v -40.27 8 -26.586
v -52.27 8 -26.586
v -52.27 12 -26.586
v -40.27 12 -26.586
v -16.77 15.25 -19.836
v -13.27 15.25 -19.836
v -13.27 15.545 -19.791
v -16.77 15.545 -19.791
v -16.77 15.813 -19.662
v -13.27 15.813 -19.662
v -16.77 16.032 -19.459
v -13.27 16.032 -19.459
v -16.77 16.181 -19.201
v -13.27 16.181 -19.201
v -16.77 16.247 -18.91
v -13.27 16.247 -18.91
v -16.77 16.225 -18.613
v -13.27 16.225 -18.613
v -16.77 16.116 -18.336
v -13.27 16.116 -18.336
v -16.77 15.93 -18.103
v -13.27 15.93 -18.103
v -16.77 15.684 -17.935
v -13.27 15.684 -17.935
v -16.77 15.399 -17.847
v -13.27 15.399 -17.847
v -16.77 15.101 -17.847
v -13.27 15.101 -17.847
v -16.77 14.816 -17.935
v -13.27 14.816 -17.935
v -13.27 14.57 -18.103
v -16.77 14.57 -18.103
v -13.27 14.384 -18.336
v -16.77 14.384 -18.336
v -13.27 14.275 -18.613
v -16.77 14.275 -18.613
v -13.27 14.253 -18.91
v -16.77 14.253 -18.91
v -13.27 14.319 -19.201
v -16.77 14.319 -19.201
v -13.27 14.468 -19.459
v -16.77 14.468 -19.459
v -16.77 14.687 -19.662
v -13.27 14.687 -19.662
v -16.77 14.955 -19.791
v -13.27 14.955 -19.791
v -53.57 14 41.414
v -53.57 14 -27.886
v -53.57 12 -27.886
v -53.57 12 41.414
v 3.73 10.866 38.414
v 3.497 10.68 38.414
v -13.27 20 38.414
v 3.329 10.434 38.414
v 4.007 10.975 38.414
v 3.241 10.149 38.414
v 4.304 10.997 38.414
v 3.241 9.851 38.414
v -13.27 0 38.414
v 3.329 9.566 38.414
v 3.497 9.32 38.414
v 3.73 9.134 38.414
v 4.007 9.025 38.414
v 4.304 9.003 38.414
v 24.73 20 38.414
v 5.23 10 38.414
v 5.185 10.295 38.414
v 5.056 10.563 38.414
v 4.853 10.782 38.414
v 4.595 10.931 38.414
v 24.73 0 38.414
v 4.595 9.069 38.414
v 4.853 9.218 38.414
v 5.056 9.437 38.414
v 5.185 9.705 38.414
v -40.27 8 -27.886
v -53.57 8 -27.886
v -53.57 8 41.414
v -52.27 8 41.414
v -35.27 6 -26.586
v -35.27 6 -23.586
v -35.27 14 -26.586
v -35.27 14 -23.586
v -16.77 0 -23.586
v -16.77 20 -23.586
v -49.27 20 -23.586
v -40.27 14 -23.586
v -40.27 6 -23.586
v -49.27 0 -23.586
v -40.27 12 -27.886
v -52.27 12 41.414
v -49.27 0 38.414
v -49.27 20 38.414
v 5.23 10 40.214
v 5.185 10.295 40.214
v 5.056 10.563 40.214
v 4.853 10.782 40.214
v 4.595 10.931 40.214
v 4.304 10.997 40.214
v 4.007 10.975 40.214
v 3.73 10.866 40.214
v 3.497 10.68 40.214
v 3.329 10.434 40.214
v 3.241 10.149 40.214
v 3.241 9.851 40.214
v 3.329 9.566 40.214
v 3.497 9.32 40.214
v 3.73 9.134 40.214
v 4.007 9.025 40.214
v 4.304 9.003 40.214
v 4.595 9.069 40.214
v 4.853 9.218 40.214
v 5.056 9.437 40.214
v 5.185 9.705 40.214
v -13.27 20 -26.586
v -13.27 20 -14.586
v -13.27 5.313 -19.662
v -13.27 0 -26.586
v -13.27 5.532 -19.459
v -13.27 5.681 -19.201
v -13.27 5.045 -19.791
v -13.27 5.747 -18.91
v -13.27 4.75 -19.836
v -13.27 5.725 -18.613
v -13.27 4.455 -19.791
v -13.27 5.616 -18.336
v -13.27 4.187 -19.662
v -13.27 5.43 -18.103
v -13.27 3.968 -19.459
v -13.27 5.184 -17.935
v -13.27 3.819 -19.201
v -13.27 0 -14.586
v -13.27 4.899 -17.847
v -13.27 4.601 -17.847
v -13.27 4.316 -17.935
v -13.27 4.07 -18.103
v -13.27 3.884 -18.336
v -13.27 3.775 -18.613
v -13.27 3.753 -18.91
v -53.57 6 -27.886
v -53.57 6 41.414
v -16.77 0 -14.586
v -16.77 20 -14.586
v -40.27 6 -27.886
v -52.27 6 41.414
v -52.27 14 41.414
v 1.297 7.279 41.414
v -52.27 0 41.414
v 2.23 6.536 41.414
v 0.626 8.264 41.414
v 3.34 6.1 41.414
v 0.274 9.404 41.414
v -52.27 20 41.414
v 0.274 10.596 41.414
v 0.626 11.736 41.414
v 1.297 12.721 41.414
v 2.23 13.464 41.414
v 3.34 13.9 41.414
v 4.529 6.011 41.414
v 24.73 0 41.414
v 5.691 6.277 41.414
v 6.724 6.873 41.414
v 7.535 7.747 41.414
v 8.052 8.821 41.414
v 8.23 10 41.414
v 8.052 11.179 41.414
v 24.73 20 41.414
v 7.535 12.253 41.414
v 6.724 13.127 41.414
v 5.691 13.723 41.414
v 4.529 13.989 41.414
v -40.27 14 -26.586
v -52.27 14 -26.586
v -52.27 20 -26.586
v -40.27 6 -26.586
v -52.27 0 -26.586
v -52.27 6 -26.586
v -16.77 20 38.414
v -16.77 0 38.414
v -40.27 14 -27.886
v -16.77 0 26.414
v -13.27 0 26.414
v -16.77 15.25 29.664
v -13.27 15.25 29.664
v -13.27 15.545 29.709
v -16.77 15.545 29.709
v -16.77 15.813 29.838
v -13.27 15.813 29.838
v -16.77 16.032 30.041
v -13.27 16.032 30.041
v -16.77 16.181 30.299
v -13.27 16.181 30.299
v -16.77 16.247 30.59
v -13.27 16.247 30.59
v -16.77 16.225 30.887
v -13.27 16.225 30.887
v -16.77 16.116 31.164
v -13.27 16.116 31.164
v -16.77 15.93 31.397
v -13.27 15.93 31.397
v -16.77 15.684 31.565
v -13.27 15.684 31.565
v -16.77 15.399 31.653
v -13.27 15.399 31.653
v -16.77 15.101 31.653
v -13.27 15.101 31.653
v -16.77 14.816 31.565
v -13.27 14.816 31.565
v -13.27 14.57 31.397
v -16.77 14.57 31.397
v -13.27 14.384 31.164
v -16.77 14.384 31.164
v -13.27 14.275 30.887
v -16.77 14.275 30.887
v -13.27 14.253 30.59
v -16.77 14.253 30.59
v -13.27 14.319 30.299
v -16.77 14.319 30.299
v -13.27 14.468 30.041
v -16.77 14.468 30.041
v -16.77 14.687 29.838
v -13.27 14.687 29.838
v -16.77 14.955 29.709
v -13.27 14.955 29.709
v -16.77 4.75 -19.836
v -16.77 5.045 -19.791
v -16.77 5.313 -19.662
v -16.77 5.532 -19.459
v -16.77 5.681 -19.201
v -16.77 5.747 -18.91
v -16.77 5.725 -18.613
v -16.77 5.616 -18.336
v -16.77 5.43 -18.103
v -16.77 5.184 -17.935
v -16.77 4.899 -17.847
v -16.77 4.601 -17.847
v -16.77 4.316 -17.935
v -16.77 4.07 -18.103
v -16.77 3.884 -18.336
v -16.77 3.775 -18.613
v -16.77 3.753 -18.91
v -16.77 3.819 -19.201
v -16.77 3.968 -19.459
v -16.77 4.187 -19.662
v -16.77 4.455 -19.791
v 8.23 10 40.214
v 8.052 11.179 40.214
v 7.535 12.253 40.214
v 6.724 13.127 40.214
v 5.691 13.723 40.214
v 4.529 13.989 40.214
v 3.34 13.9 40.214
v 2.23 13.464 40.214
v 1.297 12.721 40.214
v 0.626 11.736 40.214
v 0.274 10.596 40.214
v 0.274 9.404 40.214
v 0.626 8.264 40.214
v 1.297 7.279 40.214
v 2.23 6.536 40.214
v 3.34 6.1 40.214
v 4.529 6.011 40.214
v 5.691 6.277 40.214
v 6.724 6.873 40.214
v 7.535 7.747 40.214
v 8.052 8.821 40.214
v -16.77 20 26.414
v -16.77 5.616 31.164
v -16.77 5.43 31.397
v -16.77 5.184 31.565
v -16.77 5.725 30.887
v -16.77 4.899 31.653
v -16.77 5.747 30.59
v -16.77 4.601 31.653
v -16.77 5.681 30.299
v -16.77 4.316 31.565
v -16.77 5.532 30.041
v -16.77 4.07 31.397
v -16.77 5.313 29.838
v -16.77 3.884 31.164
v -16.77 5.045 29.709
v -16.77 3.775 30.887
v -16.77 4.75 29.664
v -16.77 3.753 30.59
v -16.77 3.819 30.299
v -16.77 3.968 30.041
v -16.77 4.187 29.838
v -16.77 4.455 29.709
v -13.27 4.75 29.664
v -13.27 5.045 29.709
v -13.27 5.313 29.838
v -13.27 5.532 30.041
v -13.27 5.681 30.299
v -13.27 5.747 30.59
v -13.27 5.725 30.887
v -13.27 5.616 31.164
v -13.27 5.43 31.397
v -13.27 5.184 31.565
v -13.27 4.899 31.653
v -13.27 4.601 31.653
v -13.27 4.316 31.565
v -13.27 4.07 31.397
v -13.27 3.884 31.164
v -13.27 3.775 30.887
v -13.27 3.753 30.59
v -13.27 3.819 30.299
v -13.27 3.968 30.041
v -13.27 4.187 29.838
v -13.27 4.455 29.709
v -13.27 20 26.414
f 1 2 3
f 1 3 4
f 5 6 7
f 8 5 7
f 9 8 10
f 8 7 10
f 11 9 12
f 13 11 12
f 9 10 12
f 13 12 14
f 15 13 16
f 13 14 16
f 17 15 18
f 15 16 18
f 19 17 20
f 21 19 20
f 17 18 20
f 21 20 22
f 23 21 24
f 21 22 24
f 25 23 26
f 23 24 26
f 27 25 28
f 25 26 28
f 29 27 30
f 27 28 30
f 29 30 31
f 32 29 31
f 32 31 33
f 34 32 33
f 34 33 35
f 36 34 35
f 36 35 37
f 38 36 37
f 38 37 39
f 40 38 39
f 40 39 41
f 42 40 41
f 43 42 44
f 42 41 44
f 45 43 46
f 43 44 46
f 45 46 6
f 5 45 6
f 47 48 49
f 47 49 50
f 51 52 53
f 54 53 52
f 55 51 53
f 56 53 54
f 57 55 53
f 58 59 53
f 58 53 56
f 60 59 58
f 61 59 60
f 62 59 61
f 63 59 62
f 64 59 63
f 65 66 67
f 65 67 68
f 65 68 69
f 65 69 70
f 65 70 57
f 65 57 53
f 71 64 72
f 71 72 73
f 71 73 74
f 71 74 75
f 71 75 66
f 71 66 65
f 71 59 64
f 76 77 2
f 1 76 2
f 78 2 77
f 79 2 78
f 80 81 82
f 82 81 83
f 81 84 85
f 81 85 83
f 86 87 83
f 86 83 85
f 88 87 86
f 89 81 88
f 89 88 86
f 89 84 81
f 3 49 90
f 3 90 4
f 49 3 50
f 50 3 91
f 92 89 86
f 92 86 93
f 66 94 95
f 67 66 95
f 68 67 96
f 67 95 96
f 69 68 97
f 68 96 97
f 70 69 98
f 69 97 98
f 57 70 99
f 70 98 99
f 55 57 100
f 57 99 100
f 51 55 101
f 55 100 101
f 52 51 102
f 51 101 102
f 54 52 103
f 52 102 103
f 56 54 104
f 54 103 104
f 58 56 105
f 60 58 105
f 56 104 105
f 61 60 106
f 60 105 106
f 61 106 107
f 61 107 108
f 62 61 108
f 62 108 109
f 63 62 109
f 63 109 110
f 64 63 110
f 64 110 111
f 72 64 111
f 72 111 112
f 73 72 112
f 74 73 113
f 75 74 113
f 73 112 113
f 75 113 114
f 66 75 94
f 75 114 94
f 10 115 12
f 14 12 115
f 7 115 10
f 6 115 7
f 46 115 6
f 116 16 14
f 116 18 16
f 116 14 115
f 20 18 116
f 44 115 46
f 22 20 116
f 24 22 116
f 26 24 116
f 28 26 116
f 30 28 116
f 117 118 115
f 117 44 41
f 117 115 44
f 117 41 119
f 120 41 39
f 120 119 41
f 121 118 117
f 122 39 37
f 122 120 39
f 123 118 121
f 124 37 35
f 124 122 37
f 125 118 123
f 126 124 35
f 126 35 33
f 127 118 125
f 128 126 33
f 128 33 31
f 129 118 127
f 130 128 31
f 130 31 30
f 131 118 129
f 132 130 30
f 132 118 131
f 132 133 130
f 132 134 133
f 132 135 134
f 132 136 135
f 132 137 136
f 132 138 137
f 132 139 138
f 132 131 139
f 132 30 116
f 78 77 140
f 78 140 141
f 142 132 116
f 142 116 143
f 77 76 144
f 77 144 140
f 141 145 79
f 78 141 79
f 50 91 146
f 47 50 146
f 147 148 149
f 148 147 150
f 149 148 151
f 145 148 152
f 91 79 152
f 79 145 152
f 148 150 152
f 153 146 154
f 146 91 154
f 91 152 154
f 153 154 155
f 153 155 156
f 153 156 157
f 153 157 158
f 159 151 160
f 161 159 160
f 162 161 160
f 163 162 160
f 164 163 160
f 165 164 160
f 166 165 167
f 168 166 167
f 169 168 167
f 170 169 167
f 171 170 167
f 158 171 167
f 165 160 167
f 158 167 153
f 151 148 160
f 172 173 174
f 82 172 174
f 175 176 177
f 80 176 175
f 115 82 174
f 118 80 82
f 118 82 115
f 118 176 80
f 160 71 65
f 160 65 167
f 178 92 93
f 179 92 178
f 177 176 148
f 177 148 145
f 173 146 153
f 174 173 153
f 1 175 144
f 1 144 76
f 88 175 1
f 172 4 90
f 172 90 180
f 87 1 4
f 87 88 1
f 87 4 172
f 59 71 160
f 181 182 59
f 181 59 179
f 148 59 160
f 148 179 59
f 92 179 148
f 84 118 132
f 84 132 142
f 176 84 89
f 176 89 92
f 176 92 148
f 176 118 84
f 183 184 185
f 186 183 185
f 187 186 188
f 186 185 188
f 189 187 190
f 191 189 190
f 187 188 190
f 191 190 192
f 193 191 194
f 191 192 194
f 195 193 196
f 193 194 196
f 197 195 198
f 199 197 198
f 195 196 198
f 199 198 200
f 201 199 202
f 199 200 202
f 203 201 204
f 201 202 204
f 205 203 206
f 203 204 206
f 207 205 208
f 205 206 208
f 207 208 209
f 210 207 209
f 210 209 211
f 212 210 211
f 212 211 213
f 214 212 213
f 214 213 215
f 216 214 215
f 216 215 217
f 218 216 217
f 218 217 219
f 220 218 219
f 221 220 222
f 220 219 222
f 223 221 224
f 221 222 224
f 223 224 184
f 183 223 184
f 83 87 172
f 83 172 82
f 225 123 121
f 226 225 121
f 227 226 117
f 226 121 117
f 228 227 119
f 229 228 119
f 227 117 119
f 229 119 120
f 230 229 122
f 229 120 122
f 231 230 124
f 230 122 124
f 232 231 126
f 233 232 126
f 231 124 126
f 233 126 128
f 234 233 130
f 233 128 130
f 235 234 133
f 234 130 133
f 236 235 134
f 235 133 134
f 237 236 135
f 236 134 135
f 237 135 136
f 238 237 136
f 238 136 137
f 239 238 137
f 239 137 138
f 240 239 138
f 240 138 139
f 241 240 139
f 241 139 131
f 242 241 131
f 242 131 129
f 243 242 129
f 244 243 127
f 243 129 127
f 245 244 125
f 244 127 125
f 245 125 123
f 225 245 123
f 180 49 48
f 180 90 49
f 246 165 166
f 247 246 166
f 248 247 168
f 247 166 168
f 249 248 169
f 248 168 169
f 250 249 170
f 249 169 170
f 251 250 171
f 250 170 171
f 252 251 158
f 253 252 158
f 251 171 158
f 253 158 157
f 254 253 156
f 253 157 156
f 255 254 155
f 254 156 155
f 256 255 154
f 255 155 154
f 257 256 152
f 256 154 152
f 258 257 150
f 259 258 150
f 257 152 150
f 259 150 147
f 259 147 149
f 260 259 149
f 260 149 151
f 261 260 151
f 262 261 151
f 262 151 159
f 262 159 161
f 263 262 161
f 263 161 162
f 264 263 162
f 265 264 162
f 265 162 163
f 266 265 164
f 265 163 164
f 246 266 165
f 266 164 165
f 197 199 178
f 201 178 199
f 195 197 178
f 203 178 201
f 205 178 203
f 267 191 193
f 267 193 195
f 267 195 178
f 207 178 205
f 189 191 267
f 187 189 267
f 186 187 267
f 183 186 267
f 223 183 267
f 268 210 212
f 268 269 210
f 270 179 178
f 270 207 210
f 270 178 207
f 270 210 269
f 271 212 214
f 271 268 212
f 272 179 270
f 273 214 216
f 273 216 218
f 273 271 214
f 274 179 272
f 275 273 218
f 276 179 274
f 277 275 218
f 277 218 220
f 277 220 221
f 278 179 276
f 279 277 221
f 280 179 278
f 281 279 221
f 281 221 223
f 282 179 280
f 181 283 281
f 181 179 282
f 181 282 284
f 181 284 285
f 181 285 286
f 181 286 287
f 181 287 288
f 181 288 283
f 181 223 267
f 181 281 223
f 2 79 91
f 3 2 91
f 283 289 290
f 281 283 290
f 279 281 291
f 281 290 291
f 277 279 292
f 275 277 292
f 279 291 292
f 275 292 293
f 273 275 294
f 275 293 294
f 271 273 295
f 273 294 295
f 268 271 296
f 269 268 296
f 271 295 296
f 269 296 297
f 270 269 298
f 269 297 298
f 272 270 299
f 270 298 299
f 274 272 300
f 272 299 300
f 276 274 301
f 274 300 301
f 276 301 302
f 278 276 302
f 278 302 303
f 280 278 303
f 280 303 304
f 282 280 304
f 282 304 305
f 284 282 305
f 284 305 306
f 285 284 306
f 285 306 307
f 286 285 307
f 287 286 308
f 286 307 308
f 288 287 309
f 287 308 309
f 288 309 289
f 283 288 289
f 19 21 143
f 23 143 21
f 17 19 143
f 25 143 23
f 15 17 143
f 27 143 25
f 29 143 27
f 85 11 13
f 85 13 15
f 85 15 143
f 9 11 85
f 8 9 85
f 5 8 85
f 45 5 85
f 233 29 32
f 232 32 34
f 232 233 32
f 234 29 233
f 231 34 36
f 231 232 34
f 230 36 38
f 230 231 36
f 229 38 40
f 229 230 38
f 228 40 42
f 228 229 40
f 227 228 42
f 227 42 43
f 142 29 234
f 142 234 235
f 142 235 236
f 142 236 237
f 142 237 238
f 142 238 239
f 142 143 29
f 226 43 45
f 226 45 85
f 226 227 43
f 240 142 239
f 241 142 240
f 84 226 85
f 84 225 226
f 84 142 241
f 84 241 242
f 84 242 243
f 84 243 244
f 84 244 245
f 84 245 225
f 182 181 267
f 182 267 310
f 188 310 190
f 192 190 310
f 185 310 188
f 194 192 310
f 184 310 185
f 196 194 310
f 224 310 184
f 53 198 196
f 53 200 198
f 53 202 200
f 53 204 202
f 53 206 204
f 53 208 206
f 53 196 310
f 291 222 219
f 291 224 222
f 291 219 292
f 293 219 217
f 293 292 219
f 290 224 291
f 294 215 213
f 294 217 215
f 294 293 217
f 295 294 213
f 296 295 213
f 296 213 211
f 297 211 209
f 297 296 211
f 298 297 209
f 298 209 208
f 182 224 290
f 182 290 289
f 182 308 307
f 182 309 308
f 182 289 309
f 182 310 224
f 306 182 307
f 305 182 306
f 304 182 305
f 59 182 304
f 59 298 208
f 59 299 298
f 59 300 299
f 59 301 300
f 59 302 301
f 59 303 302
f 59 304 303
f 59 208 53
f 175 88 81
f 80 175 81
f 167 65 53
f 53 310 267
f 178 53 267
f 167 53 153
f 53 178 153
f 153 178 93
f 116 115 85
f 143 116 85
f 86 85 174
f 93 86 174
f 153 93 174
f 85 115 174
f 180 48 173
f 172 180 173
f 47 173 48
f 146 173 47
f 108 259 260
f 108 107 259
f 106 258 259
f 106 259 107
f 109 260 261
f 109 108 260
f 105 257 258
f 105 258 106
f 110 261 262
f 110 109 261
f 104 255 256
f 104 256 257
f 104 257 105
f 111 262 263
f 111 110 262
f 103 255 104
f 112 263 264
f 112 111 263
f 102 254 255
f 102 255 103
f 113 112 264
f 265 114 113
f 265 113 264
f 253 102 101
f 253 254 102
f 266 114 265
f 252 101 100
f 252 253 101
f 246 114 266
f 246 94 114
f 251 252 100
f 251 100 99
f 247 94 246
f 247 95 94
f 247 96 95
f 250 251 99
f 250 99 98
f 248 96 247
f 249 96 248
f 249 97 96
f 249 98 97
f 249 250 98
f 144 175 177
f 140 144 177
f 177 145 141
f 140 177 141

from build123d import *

# Parameters (mm, degrees)
SALIENTE_EXTRUIR1_DEPTH = 20
CROQUIS2_R              = 4
CORTAR_EXTRUIR1_DEPTH   = 1.2
CROQUIS3_R              = 1
CORTAR_EXTRUIR3_DEPTH   = 1.8
CROQUIS4_R              = 1
CORTAR_EXTRUIR4_DEPTH   = 3.5
CROQUIS7_R              = 1
CORTAR_EXTRUIR5_DEPTH   = 3.5
CROQUIS8_W              = 5
CROQUIS8_H              = 8
CORTAR_EXTRUIR6_DEPTH   = 3
CROQUIS9_W              = 12
CROQUIS9_H              = 2
SALIENTE_EXTRUIR2_DEPTH = 1.3
CROQUIS10_W             = 69.3
CROQUIS10_H             = 2
SALIENTE_EXTRUIR3_DEPTH = 1.3


with BuildPart() as part:
    # Croquis1 → Saliente-Extruir1 (new body)
    with BuildSketch(Plane(origin=(0, 0, 0), x_dir=(1, 0, 0), z_dir=(0, 1, 0))):
        Polygon((24.729603414, -41.414237295), (-52.270396586, -41.414237295), (-52.270396586, 26.585762705), (-13.270396586, 26.585762705), (-13.270396586, 14.585762705), (-16.770396586, 14.585762705), (-16.770396586, 23.585762705), (-49.270396586, 23.585762705), (-49.270396586, -38.414237295), (-16.770396586, -38.414237295), (-16.770396586, -26.414237295), (-13.270396586, -26.414237295), (-13.270396586, -38.414237295), (24.729603414, -38.414237295), align=None)
    extrude(amount=SALIENTE_EXTRUIR1_DEPTH)

    # Croquis2 → Cortar-Extruir1 (cut)
    with BuildSketch(Plane.XY.offset(41.414237295)):
        with Locations((4.229603414, 10)):
            Circle(CROQUIS2_R)
    extrude(amount=-CORTAR_EXTRUIR1_DEPTH, mode=Mode.SUBTRACT)

    # Croquis3 → Cortar-Extruir3 (cut)
    with BuildSketch(Plane.XY.offset(40.214237295)):
        with Locations((4.229603414, 10)):
            Circle(CROQUIS3_R)
    extrude(amount=-CORTAR_EXTRUIR3_DEPTH, mode=Mode.SUBTRACT)

    # Croquis4 → Cortar-Extruir4 (cut)
    with BuildSketch(Plane(origin=(-13.270396586, 0, 0), x_dir=(0, 0, -1), z_dir=(1, 0, 0))):
        with Locations((-30.664237295, 15.25)):
            Circle(CROQUIS4_R)
        with Locations((-30.664237295, 4.75)):
            Circle(CROQUIS4_R)
    extrude(amount=-CORTAR_EXTRUIR4_DEPTH, mode=Mode.SUBTRACT)

    # Croquis7 → Cortar-Extruir5 (cut)
    with BuildSketch(Plane(origin=(-13.270396586, 0, 0), x_dir=(0, 0, -1), z_dir=(1, 0, 0))):
        with Locations((18.835762705, 15.25)):
            Circle(CROQUIS7_R)
        with Locations((18.835762705, 4.75)):
            Circle(CROQUIS7_R)
    extrude(amount=-CORTAR_EXTRUIR5_DEPTH, mode=Mode.SUBTRACT)

    # Croquis8 → Cortar-Extruir6 (cut)
    with BuildSketch(Plane.XY.offset(-23.585762705)):
        with Locations((-37.770396586, 10)):
            Rectangle(CROQUIS8_W, CROQUIS8_H)
    extrude(amount=-CORTAR_EXTRUIR6_DEPTH, mode=Mode.SUBTRACT)

    # Croquis9 → Saliente-Extruir2 (add)
    with BuildSketch(Plane(origin=(0, 0, -26.585762705), x_dir=(-1, 0, 0), z_dir=(0, 0, -1))):
        with Locations((46.270396586, 7)):
            Rectangle(CROQUIS9_W, CROQUIS9_H)
        with Locations((46.270396586, 13)):
            Rectangle(CROQUIS9_W, CROQUIS9_H)
    extrude(amount=SALIENTE_EXTRUIR2_DEPTH)

    # Croquis10 → Saliente-Extruir3 (add)
    with BuildSketch(Plane.ZY.offset(52.270396586)):
        with Locations((6.764237295, 13)):
            Rectangle(CROQUIS10_W, CROQUIS10_H)
        with Locations((6.764237295, 7)):
            Rectangle(CROQUIS10_W, CROQUIS10_H)
    extrude(amount=SALIENTE_EXTRUIR3_DEPTH)


solid = part.part
